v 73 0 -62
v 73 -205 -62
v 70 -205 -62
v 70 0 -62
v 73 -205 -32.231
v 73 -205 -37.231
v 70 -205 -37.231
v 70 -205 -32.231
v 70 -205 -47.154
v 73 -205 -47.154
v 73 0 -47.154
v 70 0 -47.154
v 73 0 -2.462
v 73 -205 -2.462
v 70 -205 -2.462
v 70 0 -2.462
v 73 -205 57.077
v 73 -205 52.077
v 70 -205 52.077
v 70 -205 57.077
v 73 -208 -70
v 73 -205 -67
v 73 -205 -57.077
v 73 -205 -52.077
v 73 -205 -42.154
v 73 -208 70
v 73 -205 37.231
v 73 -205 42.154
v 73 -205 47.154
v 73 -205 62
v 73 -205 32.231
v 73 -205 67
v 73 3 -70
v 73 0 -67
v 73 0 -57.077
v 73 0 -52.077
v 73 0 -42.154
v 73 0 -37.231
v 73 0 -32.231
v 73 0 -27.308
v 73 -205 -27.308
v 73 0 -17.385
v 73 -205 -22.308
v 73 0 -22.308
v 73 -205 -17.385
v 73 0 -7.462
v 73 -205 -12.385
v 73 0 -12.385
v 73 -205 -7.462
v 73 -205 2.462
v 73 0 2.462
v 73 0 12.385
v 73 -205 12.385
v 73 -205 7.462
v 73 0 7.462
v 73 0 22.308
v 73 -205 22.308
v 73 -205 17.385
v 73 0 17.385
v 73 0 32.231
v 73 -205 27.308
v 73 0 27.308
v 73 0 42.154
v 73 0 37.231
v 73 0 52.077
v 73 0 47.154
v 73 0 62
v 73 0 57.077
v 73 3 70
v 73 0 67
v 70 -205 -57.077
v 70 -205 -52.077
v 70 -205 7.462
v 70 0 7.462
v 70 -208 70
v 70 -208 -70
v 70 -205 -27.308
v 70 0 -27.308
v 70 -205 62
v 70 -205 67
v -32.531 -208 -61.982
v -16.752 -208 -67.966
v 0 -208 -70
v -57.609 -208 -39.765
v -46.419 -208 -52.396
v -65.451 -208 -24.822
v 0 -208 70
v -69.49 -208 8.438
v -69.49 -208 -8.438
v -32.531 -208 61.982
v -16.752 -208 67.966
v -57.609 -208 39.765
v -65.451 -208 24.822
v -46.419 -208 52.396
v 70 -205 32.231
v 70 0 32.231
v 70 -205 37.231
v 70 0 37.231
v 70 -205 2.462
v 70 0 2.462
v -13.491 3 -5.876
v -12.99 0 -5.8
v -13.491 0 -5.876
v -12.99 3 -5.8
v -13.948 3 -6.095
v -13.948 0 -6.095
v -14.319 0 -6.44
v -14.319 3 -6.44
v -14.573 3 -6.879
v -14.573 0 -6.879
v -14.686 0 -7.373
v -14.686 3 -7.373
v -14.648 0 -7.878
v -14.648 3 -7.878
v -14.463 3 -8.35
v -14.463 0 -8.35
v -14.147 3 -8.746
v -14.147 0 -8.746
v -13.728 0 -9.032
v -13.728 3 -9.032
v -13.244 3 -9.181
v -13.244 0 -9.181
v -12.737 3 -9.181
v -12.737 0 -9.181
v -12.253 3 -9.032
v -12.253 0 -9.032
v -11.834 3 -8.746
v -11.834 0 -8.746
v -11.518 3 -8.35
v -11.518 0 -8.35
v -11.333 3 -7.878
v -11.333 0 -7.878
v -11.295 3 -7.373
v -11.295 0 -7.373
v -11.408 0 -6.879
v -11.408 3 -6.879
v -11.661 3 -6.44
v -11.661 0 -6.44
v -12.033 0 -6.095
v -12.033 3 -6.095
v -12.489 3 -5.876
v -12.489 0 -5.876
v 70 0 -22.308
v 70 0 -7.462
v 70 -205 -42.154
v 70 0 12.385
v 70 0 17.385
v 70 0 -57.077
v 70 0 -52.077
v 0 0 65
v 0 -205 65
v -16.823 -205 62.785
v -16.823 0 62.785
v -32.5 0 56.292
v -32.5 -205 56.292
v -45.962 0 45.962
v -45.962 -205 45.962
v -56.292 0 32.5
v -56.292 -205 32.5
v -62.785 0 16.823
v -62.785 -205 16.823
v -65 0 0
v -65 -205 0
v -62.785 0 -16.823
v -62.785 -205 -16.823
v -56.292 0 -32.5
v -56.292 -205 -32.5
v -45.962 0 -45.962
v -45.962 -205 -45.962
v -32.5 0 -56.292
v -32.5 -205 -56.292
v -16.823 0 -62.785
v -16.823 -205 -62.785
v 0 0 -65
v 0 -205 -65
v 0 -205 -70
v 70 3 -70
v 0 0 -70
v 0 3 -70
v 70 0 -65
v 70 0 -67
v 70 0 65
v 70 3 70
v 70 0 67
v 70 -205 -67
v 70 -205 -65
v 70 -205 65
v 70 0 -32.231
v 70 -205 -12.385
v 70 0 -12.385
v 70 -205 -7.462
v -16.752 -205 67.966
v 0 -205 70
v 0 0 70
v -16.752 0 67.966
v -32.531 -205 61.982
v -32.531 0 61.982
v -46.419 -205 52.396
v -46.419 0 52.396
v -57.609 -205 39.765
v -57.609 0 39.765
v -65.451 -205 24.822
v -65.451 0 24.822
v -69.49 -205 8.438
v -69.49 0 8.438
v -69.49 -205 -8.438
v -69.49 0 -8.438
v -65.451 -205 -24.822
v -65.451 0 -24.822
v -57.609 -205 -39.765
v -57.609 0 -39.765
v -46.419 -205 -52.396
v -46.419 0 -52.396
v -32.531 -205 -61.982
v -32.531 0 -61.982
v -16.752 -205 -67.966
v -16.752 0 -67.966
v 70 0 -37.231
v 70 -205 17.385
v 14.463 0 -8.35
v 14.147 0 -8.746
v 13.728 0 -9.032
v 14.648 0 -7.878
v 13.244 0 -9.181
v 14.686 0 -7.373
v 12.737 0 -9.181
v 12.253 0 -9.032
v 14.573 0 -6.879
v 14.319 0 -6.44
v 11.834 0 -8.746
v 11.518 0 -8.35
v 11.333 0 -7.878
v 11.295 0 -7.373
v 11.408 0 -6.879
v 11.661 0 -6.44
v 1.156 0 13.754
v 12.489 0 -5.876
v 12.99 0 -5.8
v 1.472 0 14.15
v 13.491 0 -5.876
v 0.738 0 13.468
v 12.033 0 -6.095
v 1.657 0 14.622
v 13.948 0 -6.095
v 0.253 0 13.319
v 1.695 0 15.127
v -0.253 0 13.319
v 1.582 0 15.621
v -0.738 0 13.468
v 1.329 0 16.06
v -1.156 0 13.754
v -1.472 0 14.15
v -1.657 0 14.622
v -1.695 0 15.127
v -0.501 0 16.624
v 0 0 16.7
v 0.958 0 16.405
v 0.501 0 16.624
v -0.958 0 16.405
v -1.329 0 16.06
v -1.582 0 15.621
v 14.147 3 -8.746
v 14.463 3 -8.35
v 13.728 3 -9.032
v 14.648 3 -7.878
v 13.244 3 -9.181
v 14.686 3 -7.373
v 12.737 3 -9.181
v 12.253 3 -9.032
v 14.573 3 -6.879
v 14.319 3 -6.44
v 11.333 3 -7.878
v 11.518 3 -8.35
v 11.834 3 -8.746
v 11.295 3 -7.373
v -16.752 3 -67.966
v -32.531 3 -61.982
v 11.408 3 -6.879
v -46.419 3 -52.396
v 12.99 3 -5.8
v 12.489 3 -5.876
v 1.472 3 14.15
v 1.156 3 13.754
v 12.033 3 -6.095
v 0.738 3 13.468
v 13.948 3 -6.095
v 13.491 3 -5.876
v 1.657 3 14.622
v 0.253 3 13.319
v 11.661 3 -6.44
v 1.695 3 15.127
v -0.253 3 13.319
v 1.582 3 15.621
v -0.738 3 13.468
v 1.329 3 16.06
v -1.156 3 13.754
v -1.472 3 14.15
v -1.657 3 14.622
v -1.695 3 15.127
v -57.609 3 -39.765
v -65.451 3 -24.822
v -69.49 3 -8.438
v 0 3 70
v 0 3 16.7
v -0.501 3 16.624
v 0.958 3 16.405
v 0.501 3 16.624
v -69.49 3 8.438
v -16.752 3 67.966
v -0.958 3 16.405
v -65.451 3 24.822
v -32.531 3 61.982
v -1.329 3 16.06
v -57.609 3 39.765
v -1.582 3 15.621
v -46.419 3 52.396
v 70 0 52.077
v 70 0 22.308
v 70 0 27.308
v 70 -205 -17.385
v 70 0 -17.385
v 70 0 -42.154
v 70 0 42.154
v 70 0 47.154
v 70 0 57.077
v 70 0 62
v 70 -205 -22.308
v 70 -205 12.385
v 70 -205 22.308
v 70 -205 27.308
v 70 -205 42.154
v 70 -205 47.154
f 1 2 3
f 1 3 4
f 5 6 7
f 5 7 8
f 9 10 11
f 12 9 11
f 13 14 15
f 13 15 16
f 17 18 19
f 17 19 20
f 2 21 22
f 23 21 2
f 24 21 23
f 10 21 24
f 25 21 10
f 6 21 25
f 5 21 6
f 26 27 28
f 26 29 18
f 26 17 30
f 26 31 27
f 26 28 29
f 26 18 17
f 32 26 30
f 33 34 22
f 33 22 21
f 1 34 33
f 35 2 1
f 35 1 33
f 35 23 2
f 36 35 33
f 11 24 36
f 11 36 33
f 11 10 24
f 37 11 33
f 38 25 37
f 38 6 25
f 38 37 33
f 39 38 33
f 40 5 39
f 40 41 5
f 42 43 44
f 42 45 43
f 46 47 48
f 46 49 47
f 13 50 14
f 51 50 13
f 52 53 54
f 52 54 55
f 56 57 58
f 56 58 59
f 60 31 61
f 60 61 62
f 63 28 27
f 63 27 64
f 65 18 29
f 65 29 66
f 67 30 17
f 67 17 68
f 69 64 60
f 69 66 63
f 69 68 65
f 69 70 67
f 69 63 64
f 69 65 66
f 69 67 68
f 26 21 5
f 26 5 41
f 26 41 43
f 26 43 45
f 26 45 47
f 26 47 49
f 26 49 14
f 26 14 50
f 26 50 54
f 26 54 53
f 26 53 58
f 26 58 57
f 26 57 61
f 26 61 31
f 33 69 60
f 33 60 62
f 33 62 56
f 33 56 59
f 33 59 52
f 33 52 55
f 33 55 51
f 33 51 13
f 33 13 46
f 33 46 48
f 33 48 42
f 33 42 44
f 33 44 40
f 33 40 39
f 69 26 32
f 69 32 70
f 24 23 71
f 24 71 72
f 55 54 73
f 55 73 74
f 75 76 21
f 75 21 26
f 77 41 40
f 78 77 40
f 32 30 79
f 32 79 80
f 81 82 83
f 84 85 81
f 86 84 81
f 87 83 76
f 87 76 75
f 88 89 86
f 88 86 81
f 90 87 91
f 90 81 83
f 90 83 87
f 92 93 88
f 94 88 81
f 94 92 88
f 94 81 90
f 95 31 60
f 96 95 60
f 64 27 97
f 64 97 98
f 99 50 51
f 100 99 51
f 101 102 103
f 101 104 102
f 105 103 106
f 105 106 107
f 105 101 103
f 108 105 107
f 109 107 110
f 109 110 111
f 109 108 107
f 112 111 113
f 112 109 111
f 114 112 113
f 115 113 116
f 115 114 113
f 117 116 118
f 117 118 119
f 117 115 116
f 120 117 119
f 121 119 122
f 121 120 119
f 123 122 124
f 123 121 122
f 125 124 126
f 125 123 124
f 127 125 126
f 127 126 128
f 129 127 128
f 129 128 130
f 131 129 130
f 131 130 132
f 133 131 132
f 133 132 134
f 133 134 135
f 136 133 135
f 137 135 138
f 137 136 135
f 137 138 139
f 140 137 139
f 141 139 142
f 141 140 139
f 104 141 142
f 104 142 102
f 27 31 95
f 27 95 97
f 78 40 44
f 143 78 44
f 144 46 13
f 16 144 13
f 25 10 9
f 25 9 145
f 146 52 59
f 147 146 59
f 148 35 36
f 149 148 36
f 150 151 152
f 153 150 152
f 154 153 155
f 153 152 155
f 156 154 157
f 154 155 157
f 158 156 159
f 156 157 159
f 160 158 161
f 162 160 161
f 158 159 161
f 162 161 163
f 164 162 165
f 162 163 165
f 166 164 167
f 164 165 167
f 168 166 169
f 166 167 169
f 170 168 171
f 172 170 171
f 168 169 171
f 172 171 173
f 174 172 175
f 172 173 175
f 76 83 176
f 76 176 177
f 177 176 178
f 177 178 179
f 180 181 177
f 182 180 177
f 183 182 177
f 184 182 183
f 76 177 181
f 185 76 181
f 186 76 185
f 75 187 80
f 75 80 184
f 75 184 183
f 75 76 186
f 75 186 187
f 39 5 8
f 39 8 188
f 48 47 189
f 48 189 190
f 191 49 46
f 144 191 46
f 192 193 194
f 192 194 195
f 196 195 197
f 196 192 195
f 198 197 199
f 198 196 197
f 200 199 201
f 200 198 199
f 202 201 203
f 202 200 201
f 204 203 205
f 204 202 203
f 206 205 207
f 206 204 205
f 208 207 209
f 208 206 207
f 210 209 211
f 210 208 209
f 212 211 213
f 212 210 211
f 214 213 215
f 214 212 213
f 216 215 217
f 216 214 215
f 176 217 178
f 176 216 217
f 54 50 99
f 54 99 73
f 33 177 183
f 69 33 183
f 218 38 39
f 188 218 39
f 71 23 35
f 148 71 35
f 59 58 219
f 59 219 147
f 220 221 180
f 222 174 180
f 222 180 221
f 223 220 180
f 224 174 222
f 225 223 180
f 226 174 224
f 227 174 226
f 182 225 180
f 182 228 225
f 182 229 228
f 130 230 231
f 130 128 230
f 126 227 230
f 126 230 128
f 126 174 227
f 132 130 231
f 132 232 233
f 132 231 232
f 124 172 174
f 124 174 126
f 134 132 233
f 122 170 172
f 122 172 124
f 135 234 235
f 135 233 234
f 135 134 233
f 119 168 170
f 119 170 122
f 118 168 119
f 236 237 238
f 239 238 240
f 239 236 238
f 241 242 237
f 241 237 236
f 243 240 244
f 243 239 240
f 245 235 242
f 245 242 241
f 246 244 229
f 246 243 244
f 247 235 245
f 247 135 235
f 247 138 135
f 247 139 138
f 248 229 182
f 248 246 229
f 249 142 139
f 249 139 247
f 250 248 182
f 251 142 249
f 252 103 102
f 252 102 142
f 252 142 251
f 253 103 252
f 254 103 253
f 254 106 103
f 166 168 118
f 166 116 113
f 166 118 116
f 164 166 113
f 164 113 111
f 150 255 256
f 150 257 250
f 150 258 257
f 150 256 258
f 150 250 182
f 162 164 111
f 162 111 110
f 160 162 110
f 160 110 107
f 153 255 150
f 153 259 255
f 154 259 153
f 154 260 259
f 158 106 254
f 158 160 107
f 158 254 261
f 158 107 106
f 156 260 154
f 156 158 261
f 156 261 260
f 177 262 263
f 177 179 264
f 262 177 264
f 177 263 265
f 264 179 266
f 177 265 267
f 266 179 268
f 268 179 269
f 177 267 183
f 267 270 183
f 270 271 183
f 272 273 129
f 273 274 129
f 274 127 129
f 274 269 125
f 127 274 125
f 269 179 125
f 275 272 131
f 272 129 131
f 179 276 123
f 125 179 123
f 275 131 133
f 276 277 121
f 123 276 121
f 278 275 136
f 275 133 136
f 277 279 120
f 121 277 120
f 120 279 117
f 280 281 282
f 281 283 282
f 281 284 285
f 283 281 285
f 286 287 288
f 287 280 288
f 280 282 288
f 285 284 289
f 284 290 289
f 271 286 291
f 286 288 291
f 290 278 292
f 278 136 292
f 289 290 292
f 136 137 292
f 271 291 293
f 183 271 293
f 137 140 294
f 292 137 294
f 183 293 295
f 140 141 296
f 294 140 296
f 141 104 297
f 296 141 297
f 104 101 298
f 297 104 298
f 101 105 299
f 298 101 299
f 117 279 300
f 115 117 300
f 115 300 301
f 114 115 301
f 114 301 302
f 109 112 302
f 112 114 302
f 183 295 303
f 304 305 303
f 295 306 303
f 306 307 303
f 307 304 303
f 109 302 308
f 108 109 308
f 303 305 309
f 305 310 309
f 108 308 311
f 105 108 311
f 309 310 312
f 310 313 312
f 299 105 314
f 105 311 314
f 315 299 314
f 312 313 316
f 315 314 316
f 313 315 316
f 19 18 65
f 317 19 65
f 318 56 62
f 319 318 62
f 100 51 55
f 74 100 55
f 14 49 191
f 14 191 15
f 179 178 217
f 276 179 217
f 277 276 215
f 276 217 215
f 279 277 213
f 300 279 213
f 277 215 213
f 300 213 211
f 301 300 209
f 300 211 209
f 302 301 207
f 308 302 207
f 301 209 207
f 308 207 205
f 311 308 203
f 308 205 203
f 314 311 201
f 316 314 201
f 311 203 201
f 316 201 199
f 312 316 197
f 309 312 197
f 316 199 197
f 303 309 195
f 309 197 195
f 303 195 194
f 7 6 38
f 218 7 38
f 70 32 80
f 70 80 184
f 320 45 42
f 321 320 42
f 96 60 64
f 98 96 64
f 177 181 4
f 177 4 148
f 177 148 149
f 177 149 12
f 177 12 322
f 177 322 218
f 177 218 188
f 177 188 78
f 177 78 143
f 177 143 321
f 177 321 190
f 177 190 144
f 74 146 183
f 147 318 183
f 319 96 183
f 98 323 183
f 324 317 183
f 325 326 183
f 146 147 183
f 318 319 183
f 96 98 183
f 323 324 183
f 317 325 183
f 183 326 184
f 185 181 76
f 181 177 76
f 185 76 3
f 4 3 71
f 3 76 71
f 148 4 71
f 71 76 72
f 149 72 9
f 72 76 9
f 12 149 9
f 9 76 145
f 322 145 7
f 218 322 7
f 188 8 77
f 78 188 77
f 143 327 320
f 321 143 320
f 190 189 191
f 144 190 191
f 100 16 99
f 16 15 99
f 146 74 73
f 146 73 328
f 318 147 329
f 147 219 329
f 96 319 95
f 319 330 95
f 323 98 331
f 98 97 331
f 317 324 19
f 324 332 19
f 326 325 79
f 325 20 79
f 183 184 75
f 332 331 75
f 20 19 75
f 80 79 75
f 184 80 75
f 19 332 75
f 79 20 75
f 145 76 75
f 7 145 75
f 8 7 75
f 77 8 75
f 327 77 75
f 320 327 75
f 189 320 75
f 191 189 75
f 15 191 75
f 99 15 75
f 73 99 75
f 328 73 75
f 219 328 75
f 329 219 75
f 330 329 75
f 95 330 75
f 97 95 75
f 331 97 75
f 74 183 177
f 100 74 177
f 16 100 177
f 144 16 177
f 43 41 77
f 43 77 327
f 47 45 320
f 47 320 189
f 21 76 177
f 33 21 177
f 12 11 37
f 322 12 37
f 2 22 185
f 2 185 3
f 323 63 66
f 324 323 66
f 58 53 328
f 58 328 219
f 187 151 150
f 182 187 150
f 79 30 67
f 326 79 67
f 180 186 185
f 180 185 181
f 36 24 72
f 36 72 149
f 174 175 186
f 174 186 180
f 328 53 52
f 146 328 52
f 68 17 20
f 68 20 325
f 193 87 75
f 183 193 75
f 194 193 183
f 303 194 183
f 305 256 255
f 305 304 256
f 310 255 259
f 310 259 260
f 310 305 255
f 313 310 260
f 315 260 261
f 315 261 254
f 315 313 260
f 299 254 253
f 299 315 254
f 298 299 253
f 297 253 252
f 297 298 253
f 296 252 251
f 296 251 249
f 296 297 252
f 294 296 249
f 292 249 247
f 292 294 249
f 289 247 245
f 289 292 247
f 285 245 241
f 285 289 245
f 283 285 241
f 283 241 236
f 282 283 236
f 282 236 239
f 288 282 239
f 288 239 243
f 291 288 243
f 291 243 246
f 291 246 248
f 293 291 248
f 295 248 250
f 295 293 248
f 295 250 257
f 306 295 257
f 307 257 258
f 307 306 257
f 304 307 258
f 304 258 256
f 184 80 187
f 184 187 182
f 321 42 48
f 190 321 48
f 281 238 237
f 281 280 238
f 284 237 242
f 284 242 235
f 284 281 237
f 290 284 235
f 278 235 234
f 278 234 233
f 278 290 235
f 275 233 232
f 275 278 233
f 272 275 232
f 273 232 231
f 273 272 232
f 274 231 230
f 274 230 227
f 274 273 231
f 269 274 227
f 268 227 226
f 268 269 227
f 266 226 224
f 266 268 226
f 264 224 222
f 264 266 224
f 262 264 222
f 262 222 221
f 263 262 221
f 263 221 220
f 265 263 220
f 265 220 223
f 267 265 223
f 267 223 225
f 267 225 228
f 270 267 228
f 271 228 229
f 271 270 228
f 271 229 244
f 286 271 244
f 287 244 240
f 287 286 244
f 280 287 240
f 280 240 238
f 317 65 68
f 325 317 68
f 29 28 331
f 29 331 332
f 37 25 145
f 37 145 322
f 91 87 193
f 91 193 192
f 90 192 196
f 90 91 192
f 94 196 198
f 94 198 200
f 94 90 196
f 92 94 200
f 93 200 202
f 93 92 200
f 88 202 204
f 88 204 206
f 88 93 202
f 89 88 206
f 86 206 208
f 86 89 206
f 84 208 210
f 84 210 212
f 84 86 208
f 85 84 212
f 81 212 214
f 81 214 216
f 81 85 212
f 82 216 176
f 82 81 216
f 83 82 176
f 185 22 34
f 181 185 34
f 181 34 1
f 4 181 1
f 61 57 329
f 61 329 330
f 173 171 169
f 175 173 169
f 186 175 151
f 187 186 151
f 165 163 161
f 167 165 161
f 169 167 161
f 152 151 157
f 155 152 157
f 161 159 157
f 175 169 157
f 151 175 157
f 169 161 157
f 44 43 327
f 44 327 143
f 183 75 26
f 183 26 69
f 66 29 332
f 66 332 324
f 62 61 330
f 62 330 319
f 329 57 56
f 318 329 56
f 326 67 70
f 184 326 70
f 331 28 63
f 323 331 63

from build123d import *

# Parameters (mm, degrees)
SKETCH1_R                     = 70
BOSS_EXTRUDE1_DEPTH           = 3
BOSS_EXTRUDE2_START           = 205
SKETCH4_R                     = 70
SKETCH4_R_2                   = 65
BOSS_EXTRUDE2_DEPTH           = 205
BOSS_EXTRUDE3_START           = 3
SKETCH5_R                     = 70
BOSS_EXTRUDE3_DEPTH           = 3
BODY_DELETE_KEEP_START        = -208
BODY_DELETE_KEEP_1_DEPTH      = 211
SKETCH6_W                     = 211
SKETCH6_H                     = 140
SKETCH6_W_2                   = 205
SKETCH6_H_2                   = 130
BOSS_EXTRUDE4_DEPTH           = 70
SKETCH7_W                     = 211
SKETCH7_H                     = 140
BOSS_EXTRUDE5_DEPTH           = 3
SKETCH8_W                     = 205
SKETCH8_H                     = 5
CUT_EXTRUDE1_DEPTH            = 3
M3_CLEARANCE_HOLE1_AT_2_COUNT = 2
M3_CLEARANCE_HOLE1_AT_2_PITCH = 25.980762114
M3_CLEARANCE_HOLE1_AT_3_COUNT = 2
M3_CLEARANCE_HOLE1_AT_3_PITCH = 25.980762114


# Read off the part's stored shape, not the designer's step: Body-Delete/Keep 1
with BuildPart() as part:
    # Sketch1 → Boss-Extrude1 (new body)
    with BuildSketch(Plane(origin=(0, 0, 0), x_dir=(-1, 0, 0), z_dir=(0, 1, 0))):
        with Locations(Location((0, 0, 0), (0, 0, 90))):
            Circle(SKETCH1_R)
    extrude(amount=BOSS_EXTRUDE1_DEPTH)

    # Sketch4 → Boss-Extrude2 (add)
    with BuildSketch(Plane.XZ.offset(BOSS_EXTRUDE2_START)):
        with Locations(Location((0, 0, 0), (0, 0, 270))):
            Circle(SKETCH4_R)
        with Locations(Location((0, 0, 0), (0, 0, 90))):
            Circle(SKETCH4_R_2, mode=Mode.SUBTRACT)
    extrude(amount=-BOSS_EXTRUDE2_DEPTH)

    # Sketch5 → Boss-Extrude3 (add)
    with BuildSketch(Plane.XZ.offset(205).offset(BOSS_EXTRUDE3_START)):
        with Locations(Location((0, 0, 0), (0, 0, 270))):
            Circle(SKETCH5_R)
    extrude(amount=-BOSS_EXTRUDE3_DEPTH)


with BuildPart() as body_2:
    # Split1: the piece on the far side of the plane
    add(part.part)
    split(bisect_by=Plane(origin=(0, 0, 0), x_dir=(0, 0, 1), z_dir=(1, 0, 0)), keep=Keep.BOTTOM)

    # Sketch6 → Boss-Extrude4 (add)
    with BuildSketch(Plane.YZ):
        with Locations((-102.5, 0)):
            Rectangle(SKETCH6_W, SKETCH6_H)
        with Locations((-102.5, 0)):
            Rectangle(SKETCH6_W_2, SKETCH6_H_2, mode=Mode.SUBTRACT)
    extrude(amount=BOSS_EXTRUDE4_DEPTH)

    # Sketch7 → Boss-Extrude5 (add)
    with BuildSketch(Plane.YZ.offset(70)):
        with Locations((-102.5, 0)):
            Rectangle(SKETCH7_W, SKETCH7_H)
    extrude(amount=BOSS_EXTRUDE5_DEPTH)

    # Sketch8 → Cut-Extrude1 (cut)
    with BuildSketch(Plane.YZ.offset(73)):
        with Locations((-102.5, 64.5)):
            Rectangle(SKETCH8_W, SKETCH8_H)
        with Locations((-102.5, 54.576923077)):
            Rectangle(SKETCH8_W, SKETCH8_H)
        with Locations((-102.5, 44.653846154)):
            Rectangle(SKETCH8_W, SKETCH8_H)
        with Locations((-102.5, 34.730769231)):
            Rectangle(SKETCH8_W, SKETCH8_H)
        with Locations((-102.5, 24.807692308)):
            Rectangle(SKETCH8_W, SKETCH8_H)
        with Locations((-102.5, 14.884615385)):
            Rectangle(SKETCH8_W, SKETCH8_H)
        with Locations((-102.5, 4.961538462)):
            Rectangle(SKETCH8_W, SKETCH8_H)
        with Locations((-102.5, -4.961538462)):
            Rectangle(SKETCH8_W, SKETCH8_H)
        with Locations((-102.5, -14.884615385)):
            Rectangle(SKETCH8_W, SKETCH8_H)
        with Locations((-102.5, -24.807692308)):
            Rectangle(SKETCH8_W, SKETCH8_H)
        with Locations((-102.5, -34.730769231)):
            Rectangle(SKETCH8_W, SKETCH8_H)
        with Locations((-102.5, -44.653846154)):
            Rectangle(SKETCH8_W, SKETCH8_H)
        with Locations((-102.5, -54.576923077)):
            Rectangle(SKETCH8_W, SKETCH8_H)
        with Locations((-102.5, -64.5)):
            Rectangle(SKETCH8_W, SKETCH8_H)
    extrude(amount=-CUT_EXTRUDE1_DEPTH, mode=Mode.SUBTRACT)


with BuildPart() as part_1:
    add(part.part)

    # Split1
    split(bisect_by=Plane(origin=(0, 0, 0), x_dir=(0, 0, 1), z_dir=(1, 0, 0)), keep=Keep.TOP)

    # Body-Delete/Keep 1 outline → Body-Delete/Keep 1 (cut)
    with BuildSketch(Plane(origin=(0, 0, 0), x_dir=(1, 0, 0), z_dir=(0, 1, 0)).offset(BODY_DELETE_KEEP_START)):
        with BuildLine():
            ThreePointArc((0, -70), (70, 0), (0, 70))
            Line((0, 70), (0, -70))
        make_face()
    extrude(amount=BODY_DELETE_KEEP_1_DEPTH, mode=Mode.SUBTRACT)


with BuildPart() as body_2_2:
    # Split2: the piece on the far side of the plane
    add(body_2.part)
    split(bisect_by=Plane(origin=(70, 0, 0), x_dir=(0, 0, 1), z_dir=(1, 0, 0)), keep=Keep.BOTTOM)

    # Sketch10 → M3 Clearance Hole1 (revolve, cut)
    with BuildSketch(Plane(origin=(12.990381057, 3, -7.5), x_dir=(0, 0, 1), z_dir=(1, 0, 0))):
        Polygon((0, 0), (0, 4.021463052), (1.7, 3), (1.7, 0), align=None)
    m3_clearance_hole1 = revolve(axis=Axis((12.990381057, 9.35, -7.5), (0, -1, 0)), mode=Mode.SUBTRACT)

    # M3 Clearance Hole1 at 2: M3 Clearance Hole1 ×2
    with Locations(*[Vector(-0.4999999999999635, 0, 0.8660254037844598) * (i * M3_CLEARANCE_HOLE1_AT_2_PITCH) for i in range(1, M3_CLEARANCE_HOLE1_AT_2_COUNT)]):
        add(m3_clearance_hole1, mode=Mode.SUBTRACT)

    # M3 Clearance Hole1 at 3: M3 Clearance Hole1 ×2
    with Locations(*[(-i * M3_CLEARANCE_HOLE1_AT_3_PITCH, 0, 0) for i in range(1, M3_CLEARANCE_HOLE1_AT_3_COUNT)]):
        add(m3_clearance_hole1, mode=Mode.SUBTRACT)


with BuildPart() as body_2_1:
    add(body_2.part)

    # Split2
    split(bisect_by=Plane(origin=(70, 0, 0), x_dir=(0, 0, 1), z_dir=(1, 0, 0)), keep=Keep.TOP)


solid = Compound([body_2_2.part, body_2_1.part])
